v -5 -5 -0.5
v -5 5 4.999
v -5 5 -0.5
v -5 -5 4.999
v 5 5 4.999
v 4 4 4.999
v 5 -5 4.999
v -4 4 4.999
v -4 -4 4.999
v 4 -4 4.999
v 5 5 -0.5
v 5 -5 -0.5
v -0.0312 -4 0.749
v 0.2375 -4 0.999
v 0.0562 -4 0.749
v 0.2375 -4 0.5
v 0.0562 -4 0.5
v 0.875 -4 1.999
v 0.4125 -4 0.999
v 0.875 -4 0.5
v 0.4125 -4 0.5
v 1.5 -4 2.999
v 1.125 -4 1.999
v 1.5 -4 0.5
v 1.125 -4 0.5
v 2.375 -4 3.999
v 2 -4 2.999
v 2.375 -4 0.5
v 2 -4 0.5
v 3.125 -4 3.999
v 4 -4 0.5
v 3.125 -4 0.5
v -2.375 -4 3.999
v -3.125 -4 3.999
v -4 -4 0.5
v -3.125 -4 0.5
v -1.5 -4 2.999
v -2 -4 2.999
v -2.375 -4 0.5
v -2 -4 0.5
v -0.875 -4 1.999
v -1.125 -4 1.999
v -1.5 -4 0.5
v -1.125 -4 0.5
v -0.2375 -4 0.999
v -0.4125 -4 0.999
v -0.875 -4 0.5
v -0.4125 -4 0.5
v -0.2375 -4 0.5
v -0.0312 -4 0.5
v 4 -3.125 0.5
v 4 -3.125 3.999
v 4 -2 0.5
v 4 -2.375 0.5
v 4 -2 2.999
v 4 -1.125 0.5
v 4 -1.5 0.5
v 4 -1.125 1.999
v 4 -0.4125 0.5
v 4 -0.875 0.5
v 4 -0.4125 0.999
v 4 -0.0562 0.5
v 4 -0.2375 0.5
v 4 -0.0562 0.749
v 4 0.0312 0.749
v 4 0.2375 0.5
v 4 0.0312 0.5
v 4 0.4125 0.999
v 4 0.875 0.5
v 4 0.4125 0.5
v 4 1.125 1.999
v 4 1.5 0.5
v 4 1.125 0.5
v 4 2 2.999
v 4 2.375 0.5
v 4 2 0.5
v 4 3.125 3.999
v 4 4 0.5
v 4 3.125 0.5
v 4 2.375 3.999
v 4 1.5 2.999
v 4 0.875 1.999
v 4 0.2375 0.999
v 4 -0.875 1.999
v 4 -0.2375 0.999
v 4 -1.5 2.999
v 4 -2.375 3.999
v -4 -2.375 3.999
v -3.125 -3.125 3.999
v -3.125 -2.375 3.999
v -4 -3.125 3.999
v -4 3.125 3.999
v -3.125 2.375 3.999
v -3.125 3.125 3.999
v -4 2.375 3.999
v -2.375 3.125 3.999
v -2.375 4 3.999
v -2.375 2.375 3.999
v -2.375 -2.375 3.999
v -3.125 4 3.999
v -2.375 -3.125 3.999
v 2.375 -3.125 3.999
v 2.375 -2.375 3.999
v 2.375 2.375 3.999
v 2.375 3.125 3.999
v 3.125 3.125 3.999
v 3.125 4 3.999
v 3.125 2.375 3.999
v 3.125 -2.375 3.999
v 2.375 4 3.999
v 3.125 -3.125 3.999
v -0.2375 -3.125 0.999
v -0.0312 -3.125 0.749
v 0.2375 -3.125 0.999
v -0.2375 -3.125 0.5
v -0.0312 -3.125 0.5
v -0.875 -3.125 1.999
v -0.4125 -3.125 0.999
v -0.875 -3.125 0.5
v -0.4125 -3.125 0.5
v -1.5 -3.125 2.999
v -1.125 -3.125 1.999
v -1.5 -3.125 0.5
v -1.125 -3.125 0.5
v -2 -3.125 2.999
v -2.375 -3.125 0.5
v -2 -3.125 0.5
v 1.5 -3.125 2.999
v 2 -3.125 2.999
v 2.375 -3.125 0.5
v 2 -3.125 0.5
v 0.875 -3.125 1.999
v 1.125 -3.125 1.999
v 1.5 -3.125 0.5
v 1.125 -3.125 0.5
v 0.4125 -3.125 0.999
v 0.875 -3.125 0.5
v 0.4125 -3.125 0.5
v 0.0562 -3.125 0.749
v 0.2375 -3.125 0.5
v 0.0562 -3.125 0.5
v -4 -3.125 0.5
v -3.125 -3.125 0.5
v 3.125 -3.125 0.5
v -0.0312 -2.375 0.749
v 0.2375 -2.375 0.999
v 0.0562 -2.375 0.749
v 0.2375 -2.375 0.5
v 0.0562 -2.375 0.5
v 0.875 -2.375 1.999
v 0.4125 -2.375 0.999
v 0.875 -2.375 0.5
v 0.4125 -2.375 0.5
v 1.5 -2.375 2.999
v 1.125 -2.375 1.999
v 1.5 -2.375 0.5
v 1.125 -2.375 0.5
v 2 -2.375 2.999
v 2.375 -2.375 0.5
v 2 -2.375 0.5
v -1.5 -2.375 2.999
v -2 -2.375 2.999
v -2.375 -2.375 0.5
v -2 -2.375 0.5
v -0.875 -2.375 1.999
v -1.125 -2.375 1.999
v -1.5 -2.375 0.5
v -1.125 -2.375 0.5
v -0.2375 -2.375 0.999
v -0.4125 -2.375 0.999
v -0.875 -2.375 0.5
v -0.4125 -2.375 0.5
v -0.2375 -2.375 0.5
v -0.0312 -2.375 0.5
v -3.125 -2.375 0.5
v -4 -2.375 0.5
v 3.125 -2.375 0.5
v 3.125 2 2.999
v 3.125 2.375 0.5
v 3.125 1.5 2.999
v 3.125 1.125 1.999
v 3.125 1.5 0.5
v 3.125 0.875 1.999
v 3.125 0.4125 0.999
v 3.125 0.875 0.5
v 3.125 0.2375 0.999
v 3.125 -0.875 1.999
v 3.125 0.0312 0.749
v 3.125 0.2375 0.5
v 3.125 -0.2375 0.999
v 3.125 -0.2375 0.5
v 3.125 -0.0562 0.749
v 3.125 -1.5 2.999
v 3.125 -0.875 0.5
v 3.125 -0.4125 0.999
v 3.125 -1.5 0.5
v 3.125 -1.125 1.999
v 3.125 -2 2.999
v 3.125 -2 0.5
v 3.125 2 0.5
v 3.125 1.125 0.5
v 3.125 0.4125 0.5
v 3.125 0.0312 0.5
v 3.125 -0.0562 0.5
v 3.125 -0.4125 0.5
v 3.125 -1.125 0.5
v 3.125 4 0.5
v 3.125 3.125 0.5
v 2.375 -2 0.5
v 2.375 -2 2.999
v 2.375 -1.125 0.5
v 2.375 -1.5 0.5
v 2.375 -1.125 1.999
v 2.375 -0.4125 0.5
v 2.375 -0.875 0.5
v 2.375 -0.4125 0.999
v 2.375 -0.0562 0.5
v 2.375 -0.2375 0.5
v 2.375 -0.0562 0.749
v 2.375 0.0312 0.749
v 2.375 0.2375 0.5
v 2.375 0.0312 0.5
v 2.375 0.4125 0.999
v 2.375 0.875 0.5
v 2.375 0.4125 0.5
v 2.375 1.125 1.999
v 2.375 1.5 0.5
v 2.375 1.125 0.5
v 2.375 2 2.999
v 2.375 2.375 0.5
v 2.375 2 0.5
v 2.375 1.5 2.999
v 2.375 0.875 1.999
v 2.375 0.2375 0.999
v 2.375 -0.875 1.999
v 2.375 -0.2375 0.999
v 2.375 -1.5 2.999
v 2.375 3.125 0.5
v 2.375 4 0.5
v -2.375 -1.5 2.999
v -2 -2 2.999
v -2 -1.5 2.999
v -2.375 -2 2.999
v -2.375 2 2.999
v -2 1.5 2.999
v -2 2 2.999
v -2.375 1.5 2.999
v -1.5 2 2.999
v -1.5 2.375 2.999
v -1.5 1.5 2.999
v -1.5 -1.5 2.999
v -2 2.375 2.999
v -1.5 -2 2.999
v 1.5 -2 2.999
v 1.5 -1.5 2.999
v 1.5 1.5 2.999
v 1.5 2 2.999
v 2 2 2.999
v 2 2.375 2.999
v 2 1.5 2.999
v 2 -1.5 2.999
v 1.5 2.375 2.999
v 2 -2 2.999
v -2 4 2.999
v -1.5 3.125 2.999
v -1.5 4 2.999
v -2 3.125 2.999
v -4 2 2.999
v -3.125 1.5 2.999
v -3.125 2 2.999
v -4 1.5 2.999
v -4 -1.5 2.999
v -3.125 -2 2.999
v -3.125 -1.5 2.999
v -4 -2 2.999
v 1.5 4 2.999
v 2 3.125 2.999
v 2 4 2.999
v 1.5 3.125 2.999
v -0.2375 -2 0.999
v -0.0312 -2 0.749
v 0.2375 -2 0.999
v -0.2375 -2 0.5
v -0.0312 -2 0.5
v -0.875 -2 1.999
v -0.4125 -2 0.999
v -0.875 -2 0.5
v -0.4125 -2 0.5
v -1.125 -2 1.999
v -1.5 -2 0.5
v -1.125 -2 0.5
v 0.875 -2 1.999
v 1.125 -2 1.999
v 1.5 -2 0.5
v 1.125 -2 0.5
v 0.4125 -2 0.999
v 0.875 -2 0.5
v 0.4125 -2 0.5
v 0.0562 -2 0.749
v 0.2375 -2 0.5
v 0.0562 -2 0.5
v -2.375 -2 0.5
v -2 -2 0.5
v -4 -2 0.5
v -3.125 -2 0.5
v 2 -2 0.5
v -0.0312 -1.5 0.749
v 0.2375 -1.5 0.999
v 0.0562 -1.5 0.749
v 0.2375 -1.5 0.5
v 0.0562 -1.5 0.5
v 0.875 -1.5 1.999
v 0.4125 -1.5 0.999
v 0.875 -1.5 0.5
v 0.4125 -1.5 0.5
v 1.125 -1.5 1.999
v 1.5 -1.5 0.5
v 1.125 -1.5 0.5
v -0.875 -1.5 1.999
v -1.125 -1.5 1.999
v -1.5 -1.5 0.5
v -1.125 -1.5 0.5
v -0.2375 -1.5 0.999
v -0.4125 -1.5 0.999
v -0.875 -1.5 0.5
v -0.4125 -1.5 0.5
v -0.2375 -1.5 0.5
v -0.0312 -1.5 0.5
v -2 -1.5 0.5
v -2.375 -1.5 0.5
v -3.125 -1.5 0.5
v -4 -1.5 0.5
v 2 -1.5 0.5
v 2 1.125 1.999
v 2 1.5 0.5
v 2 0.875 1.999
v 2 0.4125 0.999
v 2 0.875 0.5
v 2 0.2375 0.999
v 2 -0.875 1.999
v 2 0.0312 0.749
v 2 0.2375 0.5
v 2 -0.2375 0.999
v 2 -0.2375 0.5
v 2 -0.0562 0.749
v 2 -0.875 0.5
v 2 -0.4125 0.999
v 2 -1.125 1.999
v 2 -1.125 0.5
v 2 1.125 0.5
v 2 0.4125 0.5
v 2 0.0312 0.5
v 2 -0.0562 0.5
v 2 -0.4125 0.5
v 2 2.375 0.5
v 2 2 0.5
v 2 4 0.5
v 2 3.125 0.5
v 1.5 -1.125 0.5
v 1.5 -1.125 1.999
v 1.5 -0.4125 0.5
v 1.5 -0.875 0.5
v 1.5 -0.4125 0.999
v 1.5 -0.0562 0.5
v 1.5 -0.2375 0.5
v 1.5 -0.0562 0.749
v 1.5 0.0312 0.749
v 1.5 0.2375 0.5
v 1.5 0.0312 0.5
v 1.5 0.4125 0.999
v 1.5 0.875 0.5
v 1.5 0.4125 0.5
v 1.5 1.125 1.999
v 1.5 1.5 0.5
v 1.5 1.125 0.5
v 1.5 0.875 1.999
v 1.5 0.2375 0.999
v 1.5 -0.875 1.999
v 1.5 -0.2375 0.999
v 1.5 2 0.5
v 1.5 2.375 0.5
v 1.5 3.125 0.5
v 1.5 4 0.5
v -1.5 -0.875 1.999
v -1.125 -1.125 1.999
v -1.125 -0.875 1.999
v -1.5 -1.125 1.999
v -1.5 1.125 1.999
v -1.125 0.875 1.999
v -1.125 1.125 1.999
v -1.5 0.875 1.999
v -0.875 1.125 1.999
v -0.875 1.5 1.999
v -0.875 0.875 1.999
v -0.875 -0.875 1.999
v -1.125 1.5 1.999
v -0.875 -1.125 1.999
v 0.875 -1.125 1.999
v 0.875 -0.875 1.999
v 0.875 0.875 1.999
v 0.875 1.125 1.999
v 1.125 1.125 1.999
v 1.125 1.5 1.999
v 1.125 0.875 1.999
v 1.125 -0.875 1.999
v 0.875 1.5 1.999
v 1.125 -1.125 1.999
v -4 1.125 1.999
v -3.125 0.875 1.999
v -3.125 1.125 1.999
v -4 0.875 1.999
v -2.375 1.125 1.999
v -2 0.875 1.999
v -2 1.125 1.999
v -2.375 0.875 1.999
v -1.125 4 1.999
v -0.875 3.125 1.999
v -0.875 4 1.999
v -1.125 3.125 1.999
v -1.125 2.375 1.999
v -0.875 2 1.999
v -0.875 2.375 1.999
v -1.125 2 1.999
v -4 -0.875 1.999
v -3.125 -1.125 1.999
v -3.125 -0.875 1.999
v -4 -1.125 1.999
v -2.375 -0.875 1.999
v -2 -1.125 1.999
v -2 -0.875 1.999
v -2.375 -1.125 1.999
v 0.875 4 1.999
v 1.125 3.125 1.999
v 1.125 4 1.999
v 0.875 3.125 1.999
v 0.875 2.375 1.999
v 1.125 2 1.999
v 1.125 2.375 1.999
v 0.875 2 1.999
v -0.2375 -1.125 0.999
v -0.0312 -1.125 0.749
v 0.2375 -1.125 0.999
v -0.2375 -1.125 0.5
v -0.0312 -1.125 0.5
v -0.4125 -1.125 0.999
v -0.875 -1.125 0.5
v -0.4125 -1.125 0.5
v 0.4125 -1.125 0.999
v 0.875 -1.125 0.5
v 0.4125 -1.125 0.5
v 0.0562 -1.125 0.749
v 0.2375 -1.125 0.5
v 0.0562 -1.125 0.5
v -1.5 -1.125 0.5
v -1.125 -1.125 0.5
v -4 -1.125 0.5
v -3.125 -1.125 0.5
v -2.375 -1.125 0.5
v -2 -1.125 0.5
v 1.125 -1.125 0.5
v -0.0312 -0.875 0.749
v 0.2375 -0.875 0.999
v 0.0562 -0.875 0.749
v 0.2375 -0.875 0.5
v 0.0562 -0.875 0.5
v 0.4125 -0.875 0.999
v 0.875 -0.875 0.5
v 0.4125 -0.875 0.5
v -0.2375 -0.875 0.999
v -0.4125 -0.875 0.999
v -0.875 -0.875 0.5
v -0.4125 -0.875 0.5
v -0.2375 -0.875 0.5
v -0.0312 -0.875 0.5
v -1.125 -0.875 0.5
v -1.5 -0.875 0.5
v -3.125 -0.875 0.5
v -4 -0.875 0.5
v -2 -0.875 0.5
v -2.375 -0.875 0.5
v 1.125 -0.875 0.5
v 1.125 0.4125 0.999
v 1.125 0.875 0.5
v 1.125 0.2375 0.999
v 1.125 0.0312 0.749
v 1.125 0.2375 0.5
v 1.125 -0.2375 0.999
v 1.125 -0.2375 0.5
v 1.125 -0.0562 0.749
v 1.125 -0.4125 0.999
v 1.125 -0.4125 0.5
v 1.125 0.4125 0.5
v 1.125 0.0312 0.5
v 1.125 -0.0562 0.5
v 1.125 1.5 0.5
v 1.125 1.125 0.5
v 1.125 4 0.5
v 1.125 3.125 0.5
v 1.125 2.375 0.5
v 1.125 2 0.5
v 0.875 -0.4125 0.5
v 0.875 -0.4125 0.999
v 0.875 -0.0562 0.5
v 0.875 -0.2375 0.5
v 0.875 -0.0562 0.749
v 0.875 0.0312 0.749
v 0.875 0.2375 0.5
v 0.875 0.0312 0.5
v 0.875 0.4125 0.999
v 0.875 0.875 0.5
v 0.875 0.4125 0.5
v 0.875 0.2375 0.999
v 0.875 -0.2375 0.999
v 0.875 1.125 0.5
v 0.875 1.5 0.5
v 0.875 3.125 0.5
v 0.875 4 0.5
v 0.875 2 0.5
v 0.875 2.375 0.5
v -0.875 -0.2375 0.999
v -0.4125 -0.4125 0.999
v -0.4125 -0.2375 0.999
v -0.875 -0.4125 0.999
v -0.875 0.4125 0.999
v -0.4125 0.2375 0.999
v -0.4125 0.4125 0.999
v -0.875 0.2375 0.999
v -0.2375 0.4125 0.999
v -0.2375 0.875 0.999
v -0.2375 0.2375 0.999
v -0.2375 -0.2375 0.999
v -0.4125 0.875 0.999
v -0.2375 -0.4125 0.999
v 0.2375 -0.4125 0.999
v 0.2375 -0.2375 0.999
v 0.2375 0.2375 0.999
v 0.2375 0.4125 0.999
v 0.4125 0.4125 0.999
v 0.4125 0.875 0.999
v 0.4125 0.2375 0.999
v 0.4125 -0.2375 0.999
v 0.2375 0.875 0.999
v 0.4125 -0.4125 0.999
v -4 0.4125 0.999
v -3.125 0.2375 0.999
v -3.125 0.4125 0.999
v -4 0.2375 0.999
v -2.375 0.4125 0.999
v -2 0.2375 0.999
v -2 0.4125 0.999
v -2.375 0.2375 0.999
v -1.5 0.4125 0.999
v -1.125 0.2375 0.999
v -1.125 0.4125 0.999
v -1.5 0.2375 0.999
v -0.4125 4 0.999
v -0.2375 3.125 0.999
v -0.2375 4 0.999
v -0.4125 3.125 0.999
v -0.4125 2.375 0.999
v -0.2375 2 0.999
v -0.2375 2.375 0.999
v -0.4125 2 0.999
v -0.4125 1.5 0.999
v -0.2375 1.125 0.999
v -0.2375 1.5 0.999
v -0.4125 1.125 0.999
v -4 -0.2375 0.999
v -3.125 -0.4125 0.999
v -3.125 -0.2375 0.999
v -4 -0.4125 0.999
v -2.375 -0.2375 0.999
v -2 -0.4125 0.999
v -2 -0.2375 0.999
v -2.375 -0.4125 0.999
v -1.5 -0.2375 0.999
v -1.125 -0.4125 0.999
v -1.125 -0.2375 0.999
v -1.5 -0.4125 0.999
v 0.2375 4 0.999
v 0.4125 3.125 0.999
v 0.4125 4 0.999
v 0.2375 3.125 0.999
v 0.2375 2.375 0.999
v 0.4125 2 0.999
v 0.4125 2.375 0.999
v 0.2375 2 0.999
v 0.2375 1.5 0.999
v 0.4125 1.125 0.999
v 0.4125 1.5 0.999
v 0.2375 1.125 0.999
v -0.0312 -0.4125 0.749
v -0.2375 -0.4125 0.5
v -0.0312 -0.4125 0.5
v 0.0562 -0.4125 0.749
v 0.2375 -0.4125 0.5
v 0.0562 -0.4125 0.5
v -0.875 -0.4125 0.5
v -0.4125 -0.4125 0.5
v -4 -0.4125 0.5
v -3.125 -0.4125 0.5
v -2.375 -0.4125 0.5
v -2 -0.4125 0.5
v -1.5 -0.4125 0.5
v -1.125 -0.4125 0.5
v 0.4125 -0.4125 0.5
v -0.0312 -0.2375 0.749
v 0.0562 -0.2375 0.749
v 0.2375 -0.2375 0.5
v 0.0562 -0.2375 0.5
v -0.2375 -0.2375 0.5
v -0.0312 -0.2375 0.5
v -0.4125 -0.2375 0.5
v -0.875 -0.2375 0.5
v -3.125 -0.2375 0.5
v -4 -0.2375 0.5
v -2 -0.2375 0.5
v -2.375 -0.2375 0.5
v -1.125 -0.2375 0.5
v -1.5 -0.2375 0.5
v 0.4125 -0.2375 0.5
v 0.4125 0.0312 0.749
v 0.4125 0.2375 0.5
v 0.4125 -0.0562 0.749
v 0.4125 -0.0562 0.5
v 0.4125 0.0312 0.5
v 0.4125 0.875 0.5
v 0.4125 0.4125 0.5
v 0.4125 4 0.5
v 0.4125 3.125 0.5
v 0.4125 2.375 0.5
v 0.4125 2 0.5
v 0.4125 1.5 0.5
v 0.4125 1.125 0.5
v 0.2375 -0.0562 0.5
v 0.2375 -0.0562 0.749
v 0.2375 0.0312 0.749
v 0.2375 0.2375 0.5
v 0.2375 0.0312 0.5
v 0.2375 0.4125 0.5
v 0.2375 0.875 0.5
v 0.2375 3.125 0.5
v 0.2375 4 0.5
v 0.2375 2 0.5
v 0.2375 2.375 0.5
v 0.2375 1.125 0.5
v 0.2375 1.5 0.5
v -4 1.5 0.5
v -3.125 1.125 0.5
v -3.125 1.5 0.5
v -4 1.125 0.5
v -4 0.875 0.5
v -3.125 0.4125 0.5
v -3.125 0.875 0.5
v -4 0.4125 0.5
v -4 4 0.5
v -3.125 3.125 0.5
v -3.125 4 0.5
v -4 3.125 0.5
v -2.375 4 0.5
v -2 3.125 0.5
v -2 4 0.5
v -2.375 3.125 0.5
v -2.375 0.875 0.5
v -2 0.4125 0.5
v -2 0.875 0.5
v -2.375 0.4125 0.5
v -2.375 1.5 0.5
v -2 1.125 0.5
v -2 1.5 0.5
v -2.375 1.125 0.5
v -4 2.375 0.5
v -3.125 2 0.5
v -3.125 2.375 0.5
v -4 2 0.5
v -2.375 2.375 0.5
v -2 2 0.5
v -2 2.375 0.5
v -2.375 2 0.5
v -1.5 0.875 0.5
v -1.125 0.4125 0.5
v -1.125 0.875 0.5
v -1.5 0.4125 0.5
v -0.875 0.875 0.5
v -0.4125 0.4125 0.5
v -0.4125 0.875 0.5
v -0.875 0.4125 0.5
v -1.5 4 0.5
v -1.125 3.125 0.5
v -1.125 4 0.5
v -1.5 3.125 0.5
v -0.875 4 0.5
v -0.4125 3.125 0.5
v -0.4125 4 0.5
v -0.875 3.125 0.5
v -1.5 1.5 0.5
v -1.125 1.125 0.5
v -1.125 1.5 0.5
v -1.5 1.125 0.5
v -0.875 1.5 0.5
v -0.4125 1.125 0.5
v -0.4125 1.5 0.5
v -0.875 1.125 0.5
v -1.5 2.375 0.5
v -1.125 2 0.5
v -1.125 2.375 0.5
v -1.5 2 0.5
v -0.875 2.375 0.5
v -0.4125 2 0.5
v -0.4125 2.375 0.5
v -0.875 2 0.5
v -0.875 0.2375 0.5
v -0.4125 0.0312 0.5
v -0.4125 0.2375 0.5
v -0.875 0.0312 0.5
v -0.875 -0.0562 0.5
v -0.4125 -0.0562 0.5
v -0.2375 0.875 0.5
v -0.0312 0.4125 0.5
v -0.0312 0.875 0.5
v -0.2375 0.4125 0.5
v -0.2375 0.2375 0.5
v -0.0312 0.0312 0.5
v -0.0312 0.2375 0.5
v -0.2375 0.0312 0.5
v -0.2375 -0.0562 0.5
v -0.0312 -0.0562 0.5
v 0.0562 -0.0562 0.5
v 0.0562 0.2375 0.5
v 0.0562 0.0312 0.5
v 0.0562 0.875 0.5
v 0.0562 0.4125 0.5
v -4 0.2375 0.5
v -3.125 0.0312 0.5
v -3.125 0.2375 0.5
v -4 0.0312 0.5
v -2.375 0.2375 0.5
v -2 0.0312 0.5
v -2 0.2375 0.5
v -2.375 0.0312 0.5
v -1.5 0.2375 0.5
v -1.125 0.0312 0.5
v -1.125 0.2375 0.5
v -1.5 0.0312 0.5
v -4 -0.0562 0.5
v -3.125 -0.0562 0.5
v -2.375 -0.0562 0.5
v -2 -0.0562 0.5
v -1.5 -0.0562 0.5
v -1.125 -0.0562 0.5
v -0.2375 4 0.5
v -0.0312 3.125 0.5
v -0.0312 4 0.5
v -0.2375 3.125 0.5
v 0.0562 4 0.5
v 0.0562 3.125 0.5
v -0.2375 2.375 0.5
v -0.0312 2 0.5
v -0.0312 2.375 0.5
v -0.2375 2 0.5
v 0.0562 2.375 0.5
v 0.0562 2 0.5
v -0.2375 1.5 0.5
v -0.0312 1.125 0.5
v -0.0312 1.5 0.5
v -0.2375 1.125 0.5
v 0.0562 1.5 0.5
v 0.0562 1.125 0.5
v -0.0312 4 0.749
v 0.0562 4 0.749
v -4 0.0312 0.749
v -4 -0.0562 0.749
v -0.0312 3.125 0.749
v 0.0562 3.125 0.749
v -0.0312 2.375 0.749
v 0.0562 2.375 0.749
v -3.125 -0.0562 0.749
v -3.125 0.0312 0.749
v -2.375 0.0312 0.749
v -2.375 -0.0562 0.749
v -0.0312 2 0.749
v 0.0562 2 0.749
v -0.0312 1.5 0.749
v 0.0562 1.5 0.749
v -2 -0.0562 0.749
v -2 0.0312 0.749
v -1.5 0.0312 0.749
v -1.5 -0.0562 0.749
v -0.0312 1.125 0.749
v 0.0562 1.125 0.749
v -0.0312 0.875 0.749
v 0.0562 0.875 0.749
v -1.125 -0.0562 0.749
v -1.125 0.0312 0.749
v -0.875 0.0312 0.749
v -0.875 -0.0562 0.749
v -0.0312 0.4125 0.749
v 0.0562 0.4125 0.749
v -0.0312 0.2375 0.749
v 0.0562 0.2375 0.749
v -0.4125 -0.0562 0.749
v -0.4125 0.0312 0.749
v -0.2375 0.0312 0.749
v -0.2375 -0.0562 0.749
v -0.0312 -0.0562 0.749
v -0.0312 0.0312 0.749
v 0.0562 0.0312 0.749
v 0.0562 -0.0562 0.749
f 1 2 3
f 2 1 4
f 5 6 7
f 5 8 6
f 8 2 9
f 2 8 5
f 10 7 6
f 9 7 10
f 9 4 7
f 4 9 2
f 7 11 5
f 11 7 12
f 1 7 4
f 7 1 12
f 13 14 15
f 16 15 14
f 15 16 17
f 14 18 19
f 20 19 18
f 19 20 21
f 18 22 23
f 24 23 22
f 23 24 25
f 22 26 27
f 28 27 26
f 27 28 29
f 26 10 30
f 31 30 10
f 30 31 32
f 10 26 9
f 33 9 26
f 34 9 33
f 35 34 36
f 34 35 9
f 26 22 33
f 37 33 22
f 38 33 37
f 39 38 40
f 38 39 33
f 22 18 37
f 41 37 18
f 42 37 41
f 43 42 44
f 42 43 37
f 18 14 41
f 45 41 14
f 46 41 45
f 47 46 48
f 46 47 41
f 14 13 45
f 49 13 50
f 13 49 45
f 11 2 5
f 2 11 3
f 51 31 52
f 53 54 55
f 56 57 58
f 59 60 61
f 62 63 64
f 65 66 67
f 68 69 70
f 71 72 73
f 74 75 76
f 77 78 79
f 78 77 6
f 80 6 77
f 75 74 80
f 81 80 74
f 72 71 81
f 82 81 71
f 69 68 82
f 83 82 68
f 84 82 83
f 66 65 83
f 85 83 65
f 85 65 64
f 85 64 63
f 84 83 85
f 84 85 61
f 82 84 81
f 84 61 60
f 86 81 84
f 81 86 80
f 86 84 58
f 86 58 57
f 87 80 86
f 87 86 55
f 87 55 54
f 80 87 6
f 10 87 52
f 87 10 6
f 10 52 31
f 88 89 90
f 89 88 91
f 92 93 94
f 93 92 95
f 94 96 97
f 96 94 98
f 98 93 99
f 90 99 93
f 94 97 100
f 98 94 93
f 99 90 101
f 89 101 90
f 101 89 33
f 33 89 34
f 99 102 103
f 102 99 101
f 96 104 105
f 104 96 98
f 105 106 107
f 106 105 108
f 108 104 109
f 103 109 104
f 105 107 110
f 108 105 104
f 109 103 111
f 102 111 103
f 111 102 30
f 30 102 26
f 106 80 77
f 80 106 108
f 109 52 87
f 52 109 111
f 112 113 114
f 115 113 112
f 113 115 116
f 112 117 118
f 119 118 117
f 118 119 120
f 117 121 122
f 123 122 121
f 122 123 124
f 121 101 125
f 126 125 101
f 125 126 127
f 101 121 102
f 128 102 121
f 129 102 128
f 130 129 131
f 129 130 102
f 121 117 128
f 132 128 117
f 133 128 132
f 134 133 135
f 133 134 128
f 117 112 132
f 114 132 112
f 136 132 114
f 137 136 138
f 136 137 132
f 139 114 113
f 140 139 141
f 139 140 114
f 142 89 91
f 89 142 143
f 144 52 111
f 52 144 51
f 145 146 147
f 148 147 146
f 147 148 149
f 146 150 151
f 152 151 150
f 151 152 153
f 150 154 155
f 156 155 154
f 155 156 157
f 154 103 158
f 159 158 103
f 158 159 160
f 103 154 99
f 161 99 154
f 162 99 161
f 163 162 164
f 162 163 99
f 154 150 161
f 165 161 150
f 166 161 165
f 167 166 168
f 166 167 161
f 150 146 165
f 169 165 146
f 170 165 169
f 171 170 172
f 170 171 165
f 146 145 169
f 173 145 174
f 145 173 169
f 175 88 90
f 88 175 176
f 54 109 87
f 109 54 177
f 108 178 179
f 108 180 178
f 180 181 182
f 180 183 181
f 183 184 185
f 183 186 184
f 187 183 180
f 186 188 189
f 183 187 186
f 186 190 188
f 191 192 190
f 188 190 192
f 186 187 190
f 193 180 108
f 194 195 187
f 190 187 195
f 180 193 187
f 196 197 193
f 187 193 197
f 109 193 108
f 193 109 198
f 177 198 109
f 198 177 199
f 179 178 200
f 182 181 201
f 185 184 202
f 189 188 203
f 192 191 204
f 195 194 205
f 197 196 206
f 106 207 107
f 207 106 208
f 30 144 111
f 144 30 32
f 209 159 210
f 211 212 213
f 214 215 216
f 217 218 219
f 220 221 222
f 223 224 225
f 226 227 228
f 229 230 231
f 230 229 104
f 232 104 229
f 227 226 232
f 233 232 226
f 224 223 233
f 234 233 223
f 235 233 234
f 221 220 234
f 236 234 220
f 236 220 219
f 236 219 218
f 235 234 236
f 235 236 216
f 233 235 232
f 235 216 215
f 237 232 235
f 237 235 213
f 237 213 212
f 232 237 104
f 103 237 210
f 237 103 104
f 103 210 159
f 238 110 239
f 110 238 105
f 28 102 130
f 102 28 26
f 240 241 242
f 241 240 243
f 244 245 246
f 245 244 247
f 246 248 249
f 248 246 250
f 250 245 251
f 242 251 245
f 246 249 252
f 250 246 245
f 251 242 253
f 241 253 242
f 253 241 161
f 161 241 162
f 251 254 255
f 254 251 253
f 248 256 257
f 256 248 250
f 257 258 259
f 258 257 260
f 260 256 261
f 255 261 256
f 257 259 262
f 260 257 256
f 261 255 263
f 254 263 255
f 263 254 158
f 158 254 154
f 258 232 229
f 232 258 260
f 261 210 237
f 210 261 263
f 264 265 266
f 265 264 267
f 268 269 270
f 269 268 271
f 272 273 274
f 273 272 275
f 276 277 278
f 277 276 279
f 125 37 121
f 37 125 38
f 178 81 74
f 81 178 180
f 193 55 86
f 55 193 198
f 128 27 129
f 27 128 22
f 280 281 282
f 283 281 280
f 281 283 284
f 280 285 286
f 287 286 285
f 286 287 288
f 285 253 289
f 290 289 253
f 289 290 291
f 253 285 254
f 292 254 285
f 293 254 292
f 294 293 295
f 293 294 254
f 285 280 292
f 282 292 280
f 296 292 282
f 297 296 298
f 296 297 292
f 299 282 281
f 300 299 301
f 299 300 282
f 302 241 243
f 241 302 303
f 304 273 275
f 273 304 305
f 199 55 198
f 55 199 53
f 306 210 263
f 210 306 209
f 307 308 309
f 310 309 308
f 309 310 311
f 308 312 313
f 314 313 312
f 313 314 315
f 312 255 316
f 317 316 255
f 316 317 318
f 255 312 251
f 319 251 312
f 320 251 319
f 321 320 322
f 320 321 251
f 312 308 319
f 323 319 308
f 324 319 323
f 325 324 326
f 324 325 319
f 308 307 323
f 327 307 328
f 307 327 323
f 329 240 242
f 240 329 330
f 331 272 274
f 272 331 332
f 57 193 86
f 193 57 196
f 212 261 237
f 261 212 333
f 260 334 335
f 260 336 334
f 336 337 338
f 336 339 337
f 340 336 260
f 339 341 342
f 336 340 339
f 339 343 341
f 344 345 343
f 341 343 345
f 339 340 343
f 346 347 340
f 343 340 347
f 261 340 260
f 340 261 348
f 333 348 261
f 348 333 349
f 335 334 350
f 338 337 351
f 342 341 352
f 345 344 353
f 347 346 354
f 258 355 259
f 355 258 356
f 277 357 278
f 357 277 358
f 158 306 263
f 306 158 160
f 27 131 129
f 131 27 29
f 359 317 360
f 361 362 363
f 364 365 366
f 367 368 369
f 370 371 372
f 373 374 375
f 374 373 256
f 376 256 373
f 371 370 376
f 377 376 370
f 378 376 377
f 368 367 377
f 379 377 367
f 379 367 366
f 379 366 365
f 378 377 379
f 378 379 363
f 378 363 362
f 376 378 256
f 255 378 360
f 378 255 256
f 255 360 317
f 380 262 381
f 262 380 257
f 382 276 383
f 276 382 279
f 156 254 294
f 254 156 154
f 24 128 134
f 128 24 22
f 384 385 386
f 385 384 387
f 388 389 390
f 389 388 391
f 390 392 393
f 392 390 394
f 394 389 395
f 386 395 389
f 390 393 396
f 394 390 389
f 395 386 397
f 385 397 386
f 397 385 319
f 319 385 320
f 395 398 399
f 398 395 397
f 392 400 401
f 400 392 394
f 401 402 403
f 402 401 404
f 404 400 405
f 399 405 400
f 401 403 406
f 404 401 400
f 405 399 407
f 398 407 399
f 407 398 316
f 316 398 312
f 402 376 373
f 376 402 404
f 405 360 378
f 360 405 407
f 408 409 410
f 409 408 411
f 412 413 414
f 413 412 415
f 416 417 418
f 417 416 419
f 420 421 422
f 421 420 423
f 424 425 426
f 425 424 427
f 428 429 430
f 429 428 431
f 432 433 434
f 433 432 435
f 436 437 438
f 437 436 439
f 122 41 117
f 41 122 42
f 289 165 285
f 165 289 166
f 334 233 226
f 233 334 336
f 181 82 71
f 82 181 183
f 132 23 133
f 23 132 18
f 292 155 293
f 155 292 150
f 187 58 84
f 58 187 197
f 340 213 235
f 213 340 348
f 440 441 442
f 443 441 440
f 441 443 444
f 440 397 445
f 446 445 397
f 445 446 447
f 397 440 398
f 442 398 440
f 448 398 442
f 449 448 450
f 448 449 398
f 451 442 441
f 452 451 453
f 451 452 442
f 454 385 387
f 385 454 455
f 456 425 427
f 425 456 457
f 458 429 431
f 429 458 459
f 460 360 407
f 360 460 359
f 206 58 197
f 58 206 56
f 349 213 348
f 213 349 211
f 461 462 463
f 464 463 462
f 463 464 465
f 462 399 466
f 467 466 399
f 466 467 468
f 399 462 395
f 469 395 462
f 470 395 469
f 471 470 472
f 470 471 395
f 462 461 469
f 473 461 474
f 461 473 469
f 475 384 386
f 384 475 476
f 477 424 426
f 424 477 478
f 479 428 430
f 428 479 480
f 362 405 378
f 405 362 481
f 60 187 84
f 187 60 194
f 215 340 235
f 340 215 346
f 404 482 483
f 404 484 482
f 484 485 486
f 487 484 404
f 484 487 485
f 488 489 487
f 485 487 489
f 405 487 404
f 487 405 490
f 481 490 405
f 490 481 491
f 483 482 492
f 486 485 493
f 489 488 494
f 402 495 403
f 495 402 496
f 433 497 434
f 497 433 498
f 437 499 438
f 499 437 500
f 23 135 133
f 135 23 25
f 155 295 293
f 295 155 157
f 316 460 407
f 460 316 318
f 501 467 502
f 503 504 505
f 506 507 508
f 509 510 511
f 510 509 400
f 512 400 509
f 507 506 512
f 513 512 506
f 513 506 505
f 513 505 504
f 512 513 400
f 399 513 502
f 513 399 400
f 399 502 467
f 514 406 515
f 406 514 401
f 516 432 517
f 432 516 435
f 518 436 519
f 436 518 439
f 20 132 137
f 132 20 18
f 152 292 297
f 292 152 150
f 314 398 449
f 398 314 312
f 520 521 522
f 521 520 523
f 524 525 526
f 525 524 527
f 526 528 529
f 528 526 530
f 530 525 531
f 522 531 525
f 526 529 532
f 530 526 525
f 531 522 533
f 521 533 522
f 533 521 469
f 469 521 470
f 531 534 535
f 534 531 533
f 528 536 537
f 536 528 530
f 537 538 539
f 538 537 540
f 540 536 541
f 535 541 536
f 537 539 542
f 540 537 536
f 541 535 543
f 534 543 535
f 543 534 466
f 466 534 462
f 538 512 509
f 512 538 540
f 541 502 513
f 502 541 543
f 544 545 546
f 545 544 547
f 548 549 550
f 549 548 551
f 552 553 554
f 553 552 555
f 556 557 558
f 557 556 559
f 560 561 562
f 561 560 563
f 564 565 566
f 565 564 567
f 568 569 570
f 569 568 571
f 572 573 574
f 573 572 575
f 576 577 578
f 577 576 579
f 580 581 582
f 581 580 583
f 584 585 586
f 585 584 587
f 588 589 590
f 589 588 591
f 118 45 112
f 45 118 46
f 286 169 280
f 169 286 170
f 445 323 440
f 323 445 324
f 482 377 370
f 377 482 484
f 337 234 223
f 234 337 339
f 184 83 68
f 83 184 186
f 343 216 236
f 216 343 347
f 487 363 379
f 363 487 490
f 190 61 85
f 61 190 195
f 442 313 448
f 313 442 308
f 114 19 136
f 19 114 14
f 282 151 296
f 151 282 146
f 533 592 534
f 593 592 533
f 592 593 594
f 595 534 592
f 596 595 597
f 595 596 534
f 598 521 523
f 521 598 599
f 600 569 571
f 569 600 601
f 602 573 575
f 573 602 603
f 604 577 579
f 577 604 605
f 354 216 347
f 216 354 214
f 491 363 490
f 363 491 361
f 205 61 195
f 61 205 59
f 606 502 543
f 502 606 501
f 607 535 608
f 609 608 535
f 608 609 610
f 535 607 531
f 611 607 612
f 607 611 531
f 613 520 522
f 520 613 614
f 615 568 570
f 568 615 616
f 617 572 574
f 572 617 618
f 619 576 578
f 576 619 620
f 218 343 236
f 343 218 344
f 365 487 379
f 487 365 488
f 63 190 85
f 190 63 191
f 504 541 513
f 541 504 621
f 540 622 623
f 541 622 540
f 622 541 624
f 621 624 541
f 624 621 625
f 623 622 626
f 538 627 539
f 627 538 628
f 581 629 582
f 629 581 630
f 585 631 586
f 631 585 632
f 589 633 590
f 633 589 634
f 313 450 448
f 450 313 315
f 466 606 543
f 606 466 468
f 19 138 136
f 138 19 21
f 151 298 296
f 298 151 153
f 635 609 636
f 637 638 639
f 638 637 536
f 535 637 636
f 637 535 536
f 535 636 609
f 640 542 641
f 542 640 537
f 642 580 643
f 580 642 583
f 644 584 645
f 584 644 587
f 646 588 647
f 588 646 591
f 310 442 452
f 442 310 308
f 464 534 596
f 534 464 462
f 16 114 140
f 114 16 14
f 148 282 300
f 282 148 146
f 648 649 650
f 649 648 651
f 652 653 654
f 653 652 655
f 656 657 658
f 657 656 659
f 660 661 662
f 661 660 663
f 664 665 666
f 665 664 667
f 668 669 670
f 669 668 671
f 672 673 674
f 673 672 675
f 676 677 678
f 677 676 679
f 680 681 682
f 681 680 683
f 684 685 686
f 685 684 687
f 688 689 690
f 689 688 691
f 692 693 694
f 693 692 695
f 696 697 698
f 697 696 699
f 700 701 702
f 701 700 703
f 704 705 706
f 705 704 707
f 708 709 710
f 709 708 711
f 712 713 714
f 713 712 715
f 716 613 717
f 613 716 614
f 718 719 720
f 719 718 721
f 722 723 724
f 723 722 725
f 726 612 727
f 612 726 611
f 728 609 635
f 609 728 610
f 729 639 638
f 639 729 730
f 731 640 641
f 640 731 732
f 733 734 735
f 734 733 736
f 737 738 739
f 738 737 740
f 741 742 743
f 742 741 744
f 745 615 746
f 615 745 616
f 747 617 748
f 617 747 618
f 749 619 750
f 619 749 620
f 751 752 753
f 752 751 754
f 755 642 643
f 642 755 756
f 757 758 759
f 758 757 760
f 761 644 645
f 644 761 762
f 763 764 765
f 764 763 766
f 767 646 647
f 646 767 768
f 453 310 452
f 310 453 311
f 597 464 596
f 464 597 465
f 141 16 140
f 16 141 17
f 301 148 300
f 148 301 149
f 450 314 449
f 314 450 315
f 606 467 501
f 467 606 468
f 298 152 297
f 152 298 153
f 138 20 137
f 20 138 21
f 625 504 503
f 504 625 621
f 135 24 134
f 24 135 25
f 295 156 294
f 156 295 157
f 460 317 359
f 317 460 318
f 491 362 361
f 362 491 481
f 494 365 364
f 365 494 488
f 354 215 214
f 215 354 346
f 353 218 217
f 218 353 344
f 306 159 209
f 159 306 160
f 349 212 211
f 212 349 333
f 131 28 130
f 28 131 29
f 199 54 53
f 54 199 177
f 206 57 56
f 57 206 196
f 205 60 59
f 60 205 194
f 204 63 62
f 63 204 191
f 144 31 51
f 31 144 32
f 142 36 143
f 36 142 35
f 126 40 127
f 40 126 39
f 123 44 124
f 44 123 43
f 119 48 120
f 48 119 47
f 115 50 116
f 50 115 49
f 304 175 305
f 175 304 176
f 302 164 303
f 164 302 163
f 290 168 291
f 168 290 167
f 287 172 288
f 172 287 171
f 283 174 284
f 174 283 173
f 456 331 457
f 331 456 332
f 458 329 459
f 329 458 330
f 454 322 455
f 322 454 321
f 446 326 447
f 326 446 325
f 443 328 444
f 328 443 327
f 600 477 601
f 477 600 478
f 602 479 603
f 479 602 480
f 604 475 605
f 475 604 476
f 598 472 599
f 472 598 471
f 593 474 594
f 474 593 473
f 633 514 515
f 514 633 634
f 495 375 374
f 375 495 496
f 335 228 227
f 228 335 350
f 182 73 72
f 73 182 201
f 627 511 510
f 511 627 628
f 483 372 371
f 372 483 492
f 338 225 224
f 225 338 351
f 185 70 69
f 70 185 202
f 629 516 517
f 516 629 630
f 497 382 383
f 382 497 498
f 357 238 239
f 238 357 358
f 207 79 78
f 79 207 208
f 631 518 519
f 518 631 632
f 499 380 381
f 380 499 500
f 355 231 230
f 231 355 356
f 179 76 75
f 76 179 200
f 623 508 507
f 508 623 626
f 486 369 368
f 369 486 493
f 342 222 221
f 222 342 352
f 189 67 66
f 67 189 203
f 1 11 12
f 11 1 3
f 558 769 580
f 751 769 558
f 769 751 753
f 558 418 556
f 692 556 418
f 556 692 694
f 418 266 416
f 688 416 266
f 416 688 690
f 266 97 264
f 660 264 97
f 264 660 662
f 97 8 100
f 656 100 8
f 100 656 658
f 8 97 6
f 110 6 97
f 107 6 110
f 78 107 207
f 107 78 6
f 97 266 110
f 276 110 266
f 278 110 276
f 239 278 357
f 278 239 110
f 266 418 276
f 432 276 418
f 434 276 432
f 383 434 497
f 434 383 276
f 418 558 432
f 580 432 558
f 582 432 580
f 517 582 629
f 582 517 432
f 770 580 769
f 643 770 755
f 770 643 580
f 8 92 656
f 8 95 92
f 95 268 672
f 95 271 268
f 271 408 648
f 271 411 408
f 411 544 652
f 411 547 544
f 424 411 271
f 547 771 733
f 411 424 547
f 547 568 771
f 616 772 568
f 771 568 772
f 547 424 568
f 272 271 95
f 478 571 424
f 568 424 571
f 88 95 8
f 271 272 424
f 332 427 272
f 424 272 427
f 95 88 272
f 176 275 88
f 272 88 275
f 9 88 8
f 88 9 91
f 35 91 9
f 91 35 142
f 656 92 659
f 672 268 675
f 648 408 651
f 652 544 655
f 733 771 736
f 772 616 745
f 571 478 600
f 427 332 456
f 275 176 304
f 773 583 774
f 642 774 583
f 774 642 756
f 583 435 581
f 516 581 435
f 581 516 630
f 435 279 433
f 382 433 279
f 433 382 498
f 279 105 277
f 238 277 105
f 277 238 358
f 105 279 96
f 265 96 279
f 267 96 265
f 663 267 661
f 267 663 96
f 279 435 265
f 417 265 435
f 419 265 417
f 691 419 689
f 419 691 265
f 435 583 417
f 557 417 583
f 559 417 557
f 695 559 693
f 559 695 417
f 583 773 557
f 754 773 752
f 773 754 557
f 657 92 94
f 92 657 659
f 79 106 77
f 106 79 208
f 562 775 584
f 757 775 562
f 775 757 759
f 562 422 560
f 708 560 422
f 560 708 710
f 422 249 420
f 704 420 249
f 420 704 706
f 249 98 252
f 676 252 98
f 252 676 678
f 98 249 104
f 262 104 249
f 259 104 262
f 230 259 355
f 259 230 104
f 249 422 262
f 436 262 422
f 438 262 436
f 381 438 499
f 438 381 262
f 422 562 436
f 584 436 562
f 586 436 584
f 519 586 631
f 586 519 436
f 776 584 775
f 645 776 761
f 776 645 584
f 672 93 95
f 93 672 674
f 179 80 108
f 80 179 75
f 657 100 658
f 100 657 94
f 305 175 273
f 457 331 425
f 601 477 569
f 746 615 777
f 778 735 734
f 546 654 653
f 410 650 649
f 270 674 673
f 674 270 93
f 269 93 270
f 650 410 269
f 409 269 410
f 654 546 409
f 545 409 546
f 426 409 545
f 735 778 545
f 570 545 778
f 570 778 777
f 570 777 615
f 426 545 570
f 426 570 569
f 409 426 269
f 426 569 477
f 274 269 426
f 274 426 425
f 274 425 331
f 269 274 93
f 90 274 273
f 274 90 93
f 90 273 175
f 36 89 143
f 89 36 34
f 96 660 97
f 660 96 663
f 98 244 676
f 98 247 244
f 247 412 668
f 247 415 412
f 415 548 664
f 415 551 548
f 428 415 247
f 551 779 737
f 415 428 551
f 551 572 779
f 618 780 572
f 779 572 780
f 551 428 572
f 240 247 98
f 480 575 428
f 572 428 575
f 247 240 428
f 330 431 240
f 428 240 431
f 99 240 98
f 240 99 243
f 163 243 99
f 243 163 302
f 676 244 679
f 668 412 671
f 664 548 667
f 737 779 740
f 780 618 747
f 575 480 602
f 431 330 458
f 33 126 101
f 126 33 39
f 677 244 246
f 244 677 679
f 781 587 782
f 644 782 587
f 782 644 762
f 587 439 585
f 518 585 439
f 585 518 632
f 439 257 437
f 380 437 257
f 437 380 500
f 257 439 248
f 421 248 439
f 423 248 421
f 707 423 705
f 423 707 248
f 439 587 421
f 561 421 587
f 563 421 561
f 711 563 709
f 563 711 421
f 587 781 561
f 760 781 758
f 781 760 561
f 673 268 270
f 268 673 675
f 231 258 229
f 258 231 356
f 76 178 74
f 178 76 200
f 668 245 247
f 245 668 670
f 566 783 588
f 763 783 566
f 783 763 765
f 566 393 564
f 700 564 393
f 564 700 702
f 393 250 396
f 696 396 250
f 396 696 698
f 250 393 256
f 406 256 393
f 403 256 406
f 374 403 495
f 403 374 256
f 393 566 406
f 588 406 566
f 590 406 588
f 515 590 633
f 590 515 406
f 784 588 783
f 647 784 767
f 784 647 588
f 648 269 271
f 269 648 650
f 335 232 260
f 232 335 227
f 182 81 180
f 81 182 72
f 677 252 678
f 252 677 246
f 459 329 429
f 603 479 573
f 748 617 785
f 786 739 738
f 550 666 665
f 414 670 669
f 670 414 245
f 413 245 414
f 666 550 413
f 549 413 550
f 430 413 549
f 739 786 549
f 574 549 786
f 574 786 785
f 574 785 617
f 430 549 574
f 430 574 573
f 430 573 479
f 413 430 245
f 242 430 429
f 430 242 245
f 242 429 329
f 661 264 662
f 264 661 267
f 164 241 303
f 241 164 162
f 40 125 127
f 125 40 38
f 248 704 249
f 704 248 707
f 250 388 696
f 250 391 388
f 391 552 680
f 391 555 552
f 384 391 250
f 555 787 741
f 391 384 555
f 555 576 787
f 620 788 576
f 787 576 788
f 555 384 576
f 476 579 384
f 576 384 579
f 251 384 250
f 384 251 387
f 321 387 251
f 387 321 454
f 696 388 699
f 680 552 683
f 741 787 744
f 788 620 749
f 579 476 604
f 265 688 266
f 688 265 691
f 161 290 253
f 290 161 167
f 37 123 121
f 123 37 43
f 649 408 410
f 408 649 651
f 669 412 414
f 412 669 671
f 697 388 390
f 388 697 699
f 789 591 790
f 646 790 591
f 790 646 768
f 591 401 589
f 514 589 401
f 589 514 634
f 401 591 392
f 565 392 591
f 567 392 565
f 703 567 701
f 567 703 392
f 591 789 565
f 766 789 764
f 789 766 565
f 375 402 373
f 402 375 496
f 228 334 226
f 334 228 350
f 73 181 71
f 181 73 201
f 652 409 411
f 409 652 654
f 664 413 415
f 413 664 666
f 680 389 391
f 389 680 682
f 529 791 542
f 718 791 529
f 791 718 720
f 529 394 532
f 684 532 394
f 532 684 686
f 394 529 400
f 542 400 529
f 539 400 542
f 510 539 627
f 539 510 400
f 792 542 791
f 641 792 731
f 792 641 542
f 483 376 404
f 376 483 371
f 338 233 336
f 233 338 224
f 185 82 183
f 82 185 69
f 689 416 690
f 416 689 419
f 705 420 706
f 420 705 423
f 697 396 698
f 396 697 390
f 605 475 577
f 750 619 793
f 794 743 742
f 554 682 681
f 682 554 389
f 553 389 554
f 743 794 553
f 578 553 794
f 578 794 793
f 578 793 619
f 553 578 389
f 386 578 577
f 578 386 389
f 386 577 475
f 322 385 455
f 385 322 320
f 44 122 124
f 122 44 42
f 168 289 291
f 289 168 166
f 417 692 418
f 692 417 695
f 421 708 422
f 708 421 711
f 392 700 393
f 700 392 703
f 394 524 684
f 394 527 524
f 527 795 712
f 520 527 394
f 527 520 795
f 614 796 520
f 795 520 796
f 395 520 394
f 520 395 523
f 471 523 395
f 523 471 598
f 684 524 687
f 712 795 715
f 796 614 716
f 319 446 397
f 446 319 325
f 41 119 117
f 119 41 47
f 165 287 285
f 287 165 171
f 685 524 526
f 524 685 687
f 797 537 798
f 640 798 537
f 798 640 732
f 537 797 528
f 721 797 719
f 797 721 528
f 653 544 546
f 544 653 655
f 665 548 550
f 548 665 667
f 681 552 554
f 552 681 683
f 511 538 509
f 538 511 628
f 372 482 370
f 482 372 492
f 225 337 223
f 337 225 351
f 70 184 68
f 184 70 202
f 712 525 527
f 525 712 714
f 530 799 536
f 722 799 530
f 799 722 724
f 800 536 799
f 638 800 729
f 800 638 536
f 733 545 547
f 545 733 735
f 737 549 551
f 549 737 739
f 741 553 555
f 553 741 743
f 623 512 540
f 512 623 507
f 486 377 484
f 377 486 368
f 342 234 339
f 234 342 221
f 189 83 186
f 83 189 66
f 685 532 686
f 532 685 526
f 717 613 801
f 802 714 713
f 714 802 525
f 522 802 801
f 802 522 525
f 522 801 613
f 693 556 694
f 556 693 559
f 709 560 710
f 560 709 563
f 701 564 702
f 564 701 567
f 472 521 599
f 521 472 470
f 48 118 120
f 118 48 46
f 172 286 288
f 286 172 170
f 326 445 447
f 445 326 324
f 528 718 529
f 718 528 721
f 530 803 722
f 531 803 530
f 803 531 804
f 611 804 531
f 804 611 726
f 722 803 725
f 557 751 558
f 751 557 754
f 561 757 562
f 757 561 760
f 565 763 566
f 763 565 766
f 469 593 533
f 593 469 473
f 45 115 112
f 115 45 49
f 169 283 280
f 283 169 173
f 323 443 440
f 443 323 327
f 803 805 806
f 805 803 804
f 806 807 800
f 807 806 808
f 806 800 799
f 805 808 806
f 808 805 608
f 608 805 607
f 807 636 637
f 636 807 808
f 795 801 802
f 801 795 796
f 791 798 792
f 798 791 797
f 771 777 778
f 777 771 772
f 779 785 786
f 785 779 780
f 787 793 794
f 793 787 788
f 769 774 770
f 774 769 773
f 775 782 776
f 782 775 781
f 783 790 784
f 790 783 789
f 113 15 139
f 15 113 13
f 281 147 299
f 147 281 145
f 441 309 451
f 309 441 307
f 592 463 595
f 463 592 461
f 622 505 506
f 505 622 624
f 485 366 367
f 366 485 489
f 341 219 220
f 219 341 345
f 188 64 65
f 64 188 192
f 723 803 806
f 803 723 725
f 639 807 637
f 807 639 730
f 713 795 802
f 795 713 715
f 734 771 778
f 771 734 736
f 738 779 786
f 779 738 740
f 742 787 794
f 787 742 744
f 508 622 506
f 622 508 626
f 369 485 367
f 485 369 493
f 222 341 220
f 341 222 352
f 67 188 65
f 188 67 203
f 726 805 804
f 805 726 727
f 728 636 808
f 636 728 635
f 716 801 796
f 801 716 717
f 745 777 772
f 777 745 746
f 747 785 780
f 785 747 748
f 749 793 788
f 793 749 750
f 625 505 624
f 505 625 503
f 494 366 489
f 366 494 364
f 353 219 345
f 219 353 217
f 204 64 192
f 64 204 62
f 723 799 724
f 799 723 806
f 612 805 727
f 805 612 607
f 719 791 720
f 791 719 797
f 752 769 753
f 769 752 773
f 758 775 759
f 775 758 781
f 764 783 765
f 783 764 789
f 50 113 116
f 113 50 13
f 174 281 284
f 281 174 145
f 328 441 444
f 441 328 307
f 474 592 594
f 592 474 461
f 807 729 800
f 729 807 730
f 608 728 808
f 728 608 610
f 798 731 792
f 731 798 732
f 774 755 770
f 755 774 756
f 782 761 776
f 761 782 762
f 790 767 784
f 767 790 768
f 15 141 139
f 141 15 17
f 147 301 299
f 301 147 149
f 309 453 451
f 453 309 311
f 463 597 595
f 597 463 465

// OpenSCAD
$fa = 1;
$fs = 0.4;

color("#808080")
cube([10,10,1], center=true);
translate([0,4.5,2.5-0.001])
    cube([10,1,5], center=true);
rotate([0,0,90])
    translate([0,4.5,2.5-0.001])
    cube([10,1,5], center=true);
    
translate([0,4.5-(1+0.75),2-0.001])
    cube([10,0.75,4], center=true);
rotate([0,0,90])
    translate([0,4.5-(1+0.75),2-0.001])
    cube([10,0.75,4], center=true);
    
translate([0,4.5-(1.5+1.25),1.5-0.001])
    cube([10,0.5,3], center=true);
rotate([0,0,90])
    translate([0,4.5-(1.5+1.25),1.5-0.001])
    cube([10,0.5,3], center=true);
    
translate([0,4.5-(2+1.5),1.0-0.001])
    cube([10,0.25,2], center=true);
rotate([0,0,90])
    translate([0,4.5-(2+1.5),1.0-0.001])
    cube([10,0.25,2], center=true);
    
translate([0,4.5-(2.5+1.675),0.5-0.001])
    cube([10,0.175,1], center=true);
rotate([0,0,90])
    translate([0,4.5-(2.5+1.675),0.5-0.001])
    cube([10,0.175,1], center=true);
    
translate([0,4.5-(2.75+1.7625),0.5-0.001])
    cube([10,0.0875,0.5], center=true);
rotate([0,0,90])
    translate([0,4.5-(2.75+1.7625),0.5-0.001])
    cube([10,0.0875,0.5], center=true);
    

rotate([0,0,180]){
    translate([0,4.5,2.5-0.001])
        cube([10,1,5], center=true);
    rotate([0,0,90])
        translate([0,4.5,2.5-0.001])
        cube([10,1,5], center=true);
        
    translate([0,4.5-(1+0.75),2-0.001])
        cube([10,0.75,4], center=true);
    rotate([0,0,90])
        translate([0,4.5-(1+0.75),2-0.001])
        cube([10,0.75,4], center=true);
        
    translate([0,4.5-(1.5+1.25),1.5-0.001])
        cube([10,0.5,3], center=true);
    rotate([0,0,90])
        translate([0,4.5-(1.5+1.25),1.5-0.001])
        cube([10,0.5,3], center=true);
        
    translate([0,4.5-(2+1.5),1.0-0.001])
        cube([10,0.25,2], center=true);
    rotate([0,0,90])
        translate([0,4.5-(2+1.5),1.0-0.001])
        cube([10,0.25,2], center=true);
        
    translate([0,4.5-(2.5+1.675),0.5-0.001])
        cube([10,0.175,1], center=true);
    rotate([0,0,90])
        translate([0,4.5-(2.5+1.675),0.5-0.001])
        cube([10,0.175,1], center=true);
}
